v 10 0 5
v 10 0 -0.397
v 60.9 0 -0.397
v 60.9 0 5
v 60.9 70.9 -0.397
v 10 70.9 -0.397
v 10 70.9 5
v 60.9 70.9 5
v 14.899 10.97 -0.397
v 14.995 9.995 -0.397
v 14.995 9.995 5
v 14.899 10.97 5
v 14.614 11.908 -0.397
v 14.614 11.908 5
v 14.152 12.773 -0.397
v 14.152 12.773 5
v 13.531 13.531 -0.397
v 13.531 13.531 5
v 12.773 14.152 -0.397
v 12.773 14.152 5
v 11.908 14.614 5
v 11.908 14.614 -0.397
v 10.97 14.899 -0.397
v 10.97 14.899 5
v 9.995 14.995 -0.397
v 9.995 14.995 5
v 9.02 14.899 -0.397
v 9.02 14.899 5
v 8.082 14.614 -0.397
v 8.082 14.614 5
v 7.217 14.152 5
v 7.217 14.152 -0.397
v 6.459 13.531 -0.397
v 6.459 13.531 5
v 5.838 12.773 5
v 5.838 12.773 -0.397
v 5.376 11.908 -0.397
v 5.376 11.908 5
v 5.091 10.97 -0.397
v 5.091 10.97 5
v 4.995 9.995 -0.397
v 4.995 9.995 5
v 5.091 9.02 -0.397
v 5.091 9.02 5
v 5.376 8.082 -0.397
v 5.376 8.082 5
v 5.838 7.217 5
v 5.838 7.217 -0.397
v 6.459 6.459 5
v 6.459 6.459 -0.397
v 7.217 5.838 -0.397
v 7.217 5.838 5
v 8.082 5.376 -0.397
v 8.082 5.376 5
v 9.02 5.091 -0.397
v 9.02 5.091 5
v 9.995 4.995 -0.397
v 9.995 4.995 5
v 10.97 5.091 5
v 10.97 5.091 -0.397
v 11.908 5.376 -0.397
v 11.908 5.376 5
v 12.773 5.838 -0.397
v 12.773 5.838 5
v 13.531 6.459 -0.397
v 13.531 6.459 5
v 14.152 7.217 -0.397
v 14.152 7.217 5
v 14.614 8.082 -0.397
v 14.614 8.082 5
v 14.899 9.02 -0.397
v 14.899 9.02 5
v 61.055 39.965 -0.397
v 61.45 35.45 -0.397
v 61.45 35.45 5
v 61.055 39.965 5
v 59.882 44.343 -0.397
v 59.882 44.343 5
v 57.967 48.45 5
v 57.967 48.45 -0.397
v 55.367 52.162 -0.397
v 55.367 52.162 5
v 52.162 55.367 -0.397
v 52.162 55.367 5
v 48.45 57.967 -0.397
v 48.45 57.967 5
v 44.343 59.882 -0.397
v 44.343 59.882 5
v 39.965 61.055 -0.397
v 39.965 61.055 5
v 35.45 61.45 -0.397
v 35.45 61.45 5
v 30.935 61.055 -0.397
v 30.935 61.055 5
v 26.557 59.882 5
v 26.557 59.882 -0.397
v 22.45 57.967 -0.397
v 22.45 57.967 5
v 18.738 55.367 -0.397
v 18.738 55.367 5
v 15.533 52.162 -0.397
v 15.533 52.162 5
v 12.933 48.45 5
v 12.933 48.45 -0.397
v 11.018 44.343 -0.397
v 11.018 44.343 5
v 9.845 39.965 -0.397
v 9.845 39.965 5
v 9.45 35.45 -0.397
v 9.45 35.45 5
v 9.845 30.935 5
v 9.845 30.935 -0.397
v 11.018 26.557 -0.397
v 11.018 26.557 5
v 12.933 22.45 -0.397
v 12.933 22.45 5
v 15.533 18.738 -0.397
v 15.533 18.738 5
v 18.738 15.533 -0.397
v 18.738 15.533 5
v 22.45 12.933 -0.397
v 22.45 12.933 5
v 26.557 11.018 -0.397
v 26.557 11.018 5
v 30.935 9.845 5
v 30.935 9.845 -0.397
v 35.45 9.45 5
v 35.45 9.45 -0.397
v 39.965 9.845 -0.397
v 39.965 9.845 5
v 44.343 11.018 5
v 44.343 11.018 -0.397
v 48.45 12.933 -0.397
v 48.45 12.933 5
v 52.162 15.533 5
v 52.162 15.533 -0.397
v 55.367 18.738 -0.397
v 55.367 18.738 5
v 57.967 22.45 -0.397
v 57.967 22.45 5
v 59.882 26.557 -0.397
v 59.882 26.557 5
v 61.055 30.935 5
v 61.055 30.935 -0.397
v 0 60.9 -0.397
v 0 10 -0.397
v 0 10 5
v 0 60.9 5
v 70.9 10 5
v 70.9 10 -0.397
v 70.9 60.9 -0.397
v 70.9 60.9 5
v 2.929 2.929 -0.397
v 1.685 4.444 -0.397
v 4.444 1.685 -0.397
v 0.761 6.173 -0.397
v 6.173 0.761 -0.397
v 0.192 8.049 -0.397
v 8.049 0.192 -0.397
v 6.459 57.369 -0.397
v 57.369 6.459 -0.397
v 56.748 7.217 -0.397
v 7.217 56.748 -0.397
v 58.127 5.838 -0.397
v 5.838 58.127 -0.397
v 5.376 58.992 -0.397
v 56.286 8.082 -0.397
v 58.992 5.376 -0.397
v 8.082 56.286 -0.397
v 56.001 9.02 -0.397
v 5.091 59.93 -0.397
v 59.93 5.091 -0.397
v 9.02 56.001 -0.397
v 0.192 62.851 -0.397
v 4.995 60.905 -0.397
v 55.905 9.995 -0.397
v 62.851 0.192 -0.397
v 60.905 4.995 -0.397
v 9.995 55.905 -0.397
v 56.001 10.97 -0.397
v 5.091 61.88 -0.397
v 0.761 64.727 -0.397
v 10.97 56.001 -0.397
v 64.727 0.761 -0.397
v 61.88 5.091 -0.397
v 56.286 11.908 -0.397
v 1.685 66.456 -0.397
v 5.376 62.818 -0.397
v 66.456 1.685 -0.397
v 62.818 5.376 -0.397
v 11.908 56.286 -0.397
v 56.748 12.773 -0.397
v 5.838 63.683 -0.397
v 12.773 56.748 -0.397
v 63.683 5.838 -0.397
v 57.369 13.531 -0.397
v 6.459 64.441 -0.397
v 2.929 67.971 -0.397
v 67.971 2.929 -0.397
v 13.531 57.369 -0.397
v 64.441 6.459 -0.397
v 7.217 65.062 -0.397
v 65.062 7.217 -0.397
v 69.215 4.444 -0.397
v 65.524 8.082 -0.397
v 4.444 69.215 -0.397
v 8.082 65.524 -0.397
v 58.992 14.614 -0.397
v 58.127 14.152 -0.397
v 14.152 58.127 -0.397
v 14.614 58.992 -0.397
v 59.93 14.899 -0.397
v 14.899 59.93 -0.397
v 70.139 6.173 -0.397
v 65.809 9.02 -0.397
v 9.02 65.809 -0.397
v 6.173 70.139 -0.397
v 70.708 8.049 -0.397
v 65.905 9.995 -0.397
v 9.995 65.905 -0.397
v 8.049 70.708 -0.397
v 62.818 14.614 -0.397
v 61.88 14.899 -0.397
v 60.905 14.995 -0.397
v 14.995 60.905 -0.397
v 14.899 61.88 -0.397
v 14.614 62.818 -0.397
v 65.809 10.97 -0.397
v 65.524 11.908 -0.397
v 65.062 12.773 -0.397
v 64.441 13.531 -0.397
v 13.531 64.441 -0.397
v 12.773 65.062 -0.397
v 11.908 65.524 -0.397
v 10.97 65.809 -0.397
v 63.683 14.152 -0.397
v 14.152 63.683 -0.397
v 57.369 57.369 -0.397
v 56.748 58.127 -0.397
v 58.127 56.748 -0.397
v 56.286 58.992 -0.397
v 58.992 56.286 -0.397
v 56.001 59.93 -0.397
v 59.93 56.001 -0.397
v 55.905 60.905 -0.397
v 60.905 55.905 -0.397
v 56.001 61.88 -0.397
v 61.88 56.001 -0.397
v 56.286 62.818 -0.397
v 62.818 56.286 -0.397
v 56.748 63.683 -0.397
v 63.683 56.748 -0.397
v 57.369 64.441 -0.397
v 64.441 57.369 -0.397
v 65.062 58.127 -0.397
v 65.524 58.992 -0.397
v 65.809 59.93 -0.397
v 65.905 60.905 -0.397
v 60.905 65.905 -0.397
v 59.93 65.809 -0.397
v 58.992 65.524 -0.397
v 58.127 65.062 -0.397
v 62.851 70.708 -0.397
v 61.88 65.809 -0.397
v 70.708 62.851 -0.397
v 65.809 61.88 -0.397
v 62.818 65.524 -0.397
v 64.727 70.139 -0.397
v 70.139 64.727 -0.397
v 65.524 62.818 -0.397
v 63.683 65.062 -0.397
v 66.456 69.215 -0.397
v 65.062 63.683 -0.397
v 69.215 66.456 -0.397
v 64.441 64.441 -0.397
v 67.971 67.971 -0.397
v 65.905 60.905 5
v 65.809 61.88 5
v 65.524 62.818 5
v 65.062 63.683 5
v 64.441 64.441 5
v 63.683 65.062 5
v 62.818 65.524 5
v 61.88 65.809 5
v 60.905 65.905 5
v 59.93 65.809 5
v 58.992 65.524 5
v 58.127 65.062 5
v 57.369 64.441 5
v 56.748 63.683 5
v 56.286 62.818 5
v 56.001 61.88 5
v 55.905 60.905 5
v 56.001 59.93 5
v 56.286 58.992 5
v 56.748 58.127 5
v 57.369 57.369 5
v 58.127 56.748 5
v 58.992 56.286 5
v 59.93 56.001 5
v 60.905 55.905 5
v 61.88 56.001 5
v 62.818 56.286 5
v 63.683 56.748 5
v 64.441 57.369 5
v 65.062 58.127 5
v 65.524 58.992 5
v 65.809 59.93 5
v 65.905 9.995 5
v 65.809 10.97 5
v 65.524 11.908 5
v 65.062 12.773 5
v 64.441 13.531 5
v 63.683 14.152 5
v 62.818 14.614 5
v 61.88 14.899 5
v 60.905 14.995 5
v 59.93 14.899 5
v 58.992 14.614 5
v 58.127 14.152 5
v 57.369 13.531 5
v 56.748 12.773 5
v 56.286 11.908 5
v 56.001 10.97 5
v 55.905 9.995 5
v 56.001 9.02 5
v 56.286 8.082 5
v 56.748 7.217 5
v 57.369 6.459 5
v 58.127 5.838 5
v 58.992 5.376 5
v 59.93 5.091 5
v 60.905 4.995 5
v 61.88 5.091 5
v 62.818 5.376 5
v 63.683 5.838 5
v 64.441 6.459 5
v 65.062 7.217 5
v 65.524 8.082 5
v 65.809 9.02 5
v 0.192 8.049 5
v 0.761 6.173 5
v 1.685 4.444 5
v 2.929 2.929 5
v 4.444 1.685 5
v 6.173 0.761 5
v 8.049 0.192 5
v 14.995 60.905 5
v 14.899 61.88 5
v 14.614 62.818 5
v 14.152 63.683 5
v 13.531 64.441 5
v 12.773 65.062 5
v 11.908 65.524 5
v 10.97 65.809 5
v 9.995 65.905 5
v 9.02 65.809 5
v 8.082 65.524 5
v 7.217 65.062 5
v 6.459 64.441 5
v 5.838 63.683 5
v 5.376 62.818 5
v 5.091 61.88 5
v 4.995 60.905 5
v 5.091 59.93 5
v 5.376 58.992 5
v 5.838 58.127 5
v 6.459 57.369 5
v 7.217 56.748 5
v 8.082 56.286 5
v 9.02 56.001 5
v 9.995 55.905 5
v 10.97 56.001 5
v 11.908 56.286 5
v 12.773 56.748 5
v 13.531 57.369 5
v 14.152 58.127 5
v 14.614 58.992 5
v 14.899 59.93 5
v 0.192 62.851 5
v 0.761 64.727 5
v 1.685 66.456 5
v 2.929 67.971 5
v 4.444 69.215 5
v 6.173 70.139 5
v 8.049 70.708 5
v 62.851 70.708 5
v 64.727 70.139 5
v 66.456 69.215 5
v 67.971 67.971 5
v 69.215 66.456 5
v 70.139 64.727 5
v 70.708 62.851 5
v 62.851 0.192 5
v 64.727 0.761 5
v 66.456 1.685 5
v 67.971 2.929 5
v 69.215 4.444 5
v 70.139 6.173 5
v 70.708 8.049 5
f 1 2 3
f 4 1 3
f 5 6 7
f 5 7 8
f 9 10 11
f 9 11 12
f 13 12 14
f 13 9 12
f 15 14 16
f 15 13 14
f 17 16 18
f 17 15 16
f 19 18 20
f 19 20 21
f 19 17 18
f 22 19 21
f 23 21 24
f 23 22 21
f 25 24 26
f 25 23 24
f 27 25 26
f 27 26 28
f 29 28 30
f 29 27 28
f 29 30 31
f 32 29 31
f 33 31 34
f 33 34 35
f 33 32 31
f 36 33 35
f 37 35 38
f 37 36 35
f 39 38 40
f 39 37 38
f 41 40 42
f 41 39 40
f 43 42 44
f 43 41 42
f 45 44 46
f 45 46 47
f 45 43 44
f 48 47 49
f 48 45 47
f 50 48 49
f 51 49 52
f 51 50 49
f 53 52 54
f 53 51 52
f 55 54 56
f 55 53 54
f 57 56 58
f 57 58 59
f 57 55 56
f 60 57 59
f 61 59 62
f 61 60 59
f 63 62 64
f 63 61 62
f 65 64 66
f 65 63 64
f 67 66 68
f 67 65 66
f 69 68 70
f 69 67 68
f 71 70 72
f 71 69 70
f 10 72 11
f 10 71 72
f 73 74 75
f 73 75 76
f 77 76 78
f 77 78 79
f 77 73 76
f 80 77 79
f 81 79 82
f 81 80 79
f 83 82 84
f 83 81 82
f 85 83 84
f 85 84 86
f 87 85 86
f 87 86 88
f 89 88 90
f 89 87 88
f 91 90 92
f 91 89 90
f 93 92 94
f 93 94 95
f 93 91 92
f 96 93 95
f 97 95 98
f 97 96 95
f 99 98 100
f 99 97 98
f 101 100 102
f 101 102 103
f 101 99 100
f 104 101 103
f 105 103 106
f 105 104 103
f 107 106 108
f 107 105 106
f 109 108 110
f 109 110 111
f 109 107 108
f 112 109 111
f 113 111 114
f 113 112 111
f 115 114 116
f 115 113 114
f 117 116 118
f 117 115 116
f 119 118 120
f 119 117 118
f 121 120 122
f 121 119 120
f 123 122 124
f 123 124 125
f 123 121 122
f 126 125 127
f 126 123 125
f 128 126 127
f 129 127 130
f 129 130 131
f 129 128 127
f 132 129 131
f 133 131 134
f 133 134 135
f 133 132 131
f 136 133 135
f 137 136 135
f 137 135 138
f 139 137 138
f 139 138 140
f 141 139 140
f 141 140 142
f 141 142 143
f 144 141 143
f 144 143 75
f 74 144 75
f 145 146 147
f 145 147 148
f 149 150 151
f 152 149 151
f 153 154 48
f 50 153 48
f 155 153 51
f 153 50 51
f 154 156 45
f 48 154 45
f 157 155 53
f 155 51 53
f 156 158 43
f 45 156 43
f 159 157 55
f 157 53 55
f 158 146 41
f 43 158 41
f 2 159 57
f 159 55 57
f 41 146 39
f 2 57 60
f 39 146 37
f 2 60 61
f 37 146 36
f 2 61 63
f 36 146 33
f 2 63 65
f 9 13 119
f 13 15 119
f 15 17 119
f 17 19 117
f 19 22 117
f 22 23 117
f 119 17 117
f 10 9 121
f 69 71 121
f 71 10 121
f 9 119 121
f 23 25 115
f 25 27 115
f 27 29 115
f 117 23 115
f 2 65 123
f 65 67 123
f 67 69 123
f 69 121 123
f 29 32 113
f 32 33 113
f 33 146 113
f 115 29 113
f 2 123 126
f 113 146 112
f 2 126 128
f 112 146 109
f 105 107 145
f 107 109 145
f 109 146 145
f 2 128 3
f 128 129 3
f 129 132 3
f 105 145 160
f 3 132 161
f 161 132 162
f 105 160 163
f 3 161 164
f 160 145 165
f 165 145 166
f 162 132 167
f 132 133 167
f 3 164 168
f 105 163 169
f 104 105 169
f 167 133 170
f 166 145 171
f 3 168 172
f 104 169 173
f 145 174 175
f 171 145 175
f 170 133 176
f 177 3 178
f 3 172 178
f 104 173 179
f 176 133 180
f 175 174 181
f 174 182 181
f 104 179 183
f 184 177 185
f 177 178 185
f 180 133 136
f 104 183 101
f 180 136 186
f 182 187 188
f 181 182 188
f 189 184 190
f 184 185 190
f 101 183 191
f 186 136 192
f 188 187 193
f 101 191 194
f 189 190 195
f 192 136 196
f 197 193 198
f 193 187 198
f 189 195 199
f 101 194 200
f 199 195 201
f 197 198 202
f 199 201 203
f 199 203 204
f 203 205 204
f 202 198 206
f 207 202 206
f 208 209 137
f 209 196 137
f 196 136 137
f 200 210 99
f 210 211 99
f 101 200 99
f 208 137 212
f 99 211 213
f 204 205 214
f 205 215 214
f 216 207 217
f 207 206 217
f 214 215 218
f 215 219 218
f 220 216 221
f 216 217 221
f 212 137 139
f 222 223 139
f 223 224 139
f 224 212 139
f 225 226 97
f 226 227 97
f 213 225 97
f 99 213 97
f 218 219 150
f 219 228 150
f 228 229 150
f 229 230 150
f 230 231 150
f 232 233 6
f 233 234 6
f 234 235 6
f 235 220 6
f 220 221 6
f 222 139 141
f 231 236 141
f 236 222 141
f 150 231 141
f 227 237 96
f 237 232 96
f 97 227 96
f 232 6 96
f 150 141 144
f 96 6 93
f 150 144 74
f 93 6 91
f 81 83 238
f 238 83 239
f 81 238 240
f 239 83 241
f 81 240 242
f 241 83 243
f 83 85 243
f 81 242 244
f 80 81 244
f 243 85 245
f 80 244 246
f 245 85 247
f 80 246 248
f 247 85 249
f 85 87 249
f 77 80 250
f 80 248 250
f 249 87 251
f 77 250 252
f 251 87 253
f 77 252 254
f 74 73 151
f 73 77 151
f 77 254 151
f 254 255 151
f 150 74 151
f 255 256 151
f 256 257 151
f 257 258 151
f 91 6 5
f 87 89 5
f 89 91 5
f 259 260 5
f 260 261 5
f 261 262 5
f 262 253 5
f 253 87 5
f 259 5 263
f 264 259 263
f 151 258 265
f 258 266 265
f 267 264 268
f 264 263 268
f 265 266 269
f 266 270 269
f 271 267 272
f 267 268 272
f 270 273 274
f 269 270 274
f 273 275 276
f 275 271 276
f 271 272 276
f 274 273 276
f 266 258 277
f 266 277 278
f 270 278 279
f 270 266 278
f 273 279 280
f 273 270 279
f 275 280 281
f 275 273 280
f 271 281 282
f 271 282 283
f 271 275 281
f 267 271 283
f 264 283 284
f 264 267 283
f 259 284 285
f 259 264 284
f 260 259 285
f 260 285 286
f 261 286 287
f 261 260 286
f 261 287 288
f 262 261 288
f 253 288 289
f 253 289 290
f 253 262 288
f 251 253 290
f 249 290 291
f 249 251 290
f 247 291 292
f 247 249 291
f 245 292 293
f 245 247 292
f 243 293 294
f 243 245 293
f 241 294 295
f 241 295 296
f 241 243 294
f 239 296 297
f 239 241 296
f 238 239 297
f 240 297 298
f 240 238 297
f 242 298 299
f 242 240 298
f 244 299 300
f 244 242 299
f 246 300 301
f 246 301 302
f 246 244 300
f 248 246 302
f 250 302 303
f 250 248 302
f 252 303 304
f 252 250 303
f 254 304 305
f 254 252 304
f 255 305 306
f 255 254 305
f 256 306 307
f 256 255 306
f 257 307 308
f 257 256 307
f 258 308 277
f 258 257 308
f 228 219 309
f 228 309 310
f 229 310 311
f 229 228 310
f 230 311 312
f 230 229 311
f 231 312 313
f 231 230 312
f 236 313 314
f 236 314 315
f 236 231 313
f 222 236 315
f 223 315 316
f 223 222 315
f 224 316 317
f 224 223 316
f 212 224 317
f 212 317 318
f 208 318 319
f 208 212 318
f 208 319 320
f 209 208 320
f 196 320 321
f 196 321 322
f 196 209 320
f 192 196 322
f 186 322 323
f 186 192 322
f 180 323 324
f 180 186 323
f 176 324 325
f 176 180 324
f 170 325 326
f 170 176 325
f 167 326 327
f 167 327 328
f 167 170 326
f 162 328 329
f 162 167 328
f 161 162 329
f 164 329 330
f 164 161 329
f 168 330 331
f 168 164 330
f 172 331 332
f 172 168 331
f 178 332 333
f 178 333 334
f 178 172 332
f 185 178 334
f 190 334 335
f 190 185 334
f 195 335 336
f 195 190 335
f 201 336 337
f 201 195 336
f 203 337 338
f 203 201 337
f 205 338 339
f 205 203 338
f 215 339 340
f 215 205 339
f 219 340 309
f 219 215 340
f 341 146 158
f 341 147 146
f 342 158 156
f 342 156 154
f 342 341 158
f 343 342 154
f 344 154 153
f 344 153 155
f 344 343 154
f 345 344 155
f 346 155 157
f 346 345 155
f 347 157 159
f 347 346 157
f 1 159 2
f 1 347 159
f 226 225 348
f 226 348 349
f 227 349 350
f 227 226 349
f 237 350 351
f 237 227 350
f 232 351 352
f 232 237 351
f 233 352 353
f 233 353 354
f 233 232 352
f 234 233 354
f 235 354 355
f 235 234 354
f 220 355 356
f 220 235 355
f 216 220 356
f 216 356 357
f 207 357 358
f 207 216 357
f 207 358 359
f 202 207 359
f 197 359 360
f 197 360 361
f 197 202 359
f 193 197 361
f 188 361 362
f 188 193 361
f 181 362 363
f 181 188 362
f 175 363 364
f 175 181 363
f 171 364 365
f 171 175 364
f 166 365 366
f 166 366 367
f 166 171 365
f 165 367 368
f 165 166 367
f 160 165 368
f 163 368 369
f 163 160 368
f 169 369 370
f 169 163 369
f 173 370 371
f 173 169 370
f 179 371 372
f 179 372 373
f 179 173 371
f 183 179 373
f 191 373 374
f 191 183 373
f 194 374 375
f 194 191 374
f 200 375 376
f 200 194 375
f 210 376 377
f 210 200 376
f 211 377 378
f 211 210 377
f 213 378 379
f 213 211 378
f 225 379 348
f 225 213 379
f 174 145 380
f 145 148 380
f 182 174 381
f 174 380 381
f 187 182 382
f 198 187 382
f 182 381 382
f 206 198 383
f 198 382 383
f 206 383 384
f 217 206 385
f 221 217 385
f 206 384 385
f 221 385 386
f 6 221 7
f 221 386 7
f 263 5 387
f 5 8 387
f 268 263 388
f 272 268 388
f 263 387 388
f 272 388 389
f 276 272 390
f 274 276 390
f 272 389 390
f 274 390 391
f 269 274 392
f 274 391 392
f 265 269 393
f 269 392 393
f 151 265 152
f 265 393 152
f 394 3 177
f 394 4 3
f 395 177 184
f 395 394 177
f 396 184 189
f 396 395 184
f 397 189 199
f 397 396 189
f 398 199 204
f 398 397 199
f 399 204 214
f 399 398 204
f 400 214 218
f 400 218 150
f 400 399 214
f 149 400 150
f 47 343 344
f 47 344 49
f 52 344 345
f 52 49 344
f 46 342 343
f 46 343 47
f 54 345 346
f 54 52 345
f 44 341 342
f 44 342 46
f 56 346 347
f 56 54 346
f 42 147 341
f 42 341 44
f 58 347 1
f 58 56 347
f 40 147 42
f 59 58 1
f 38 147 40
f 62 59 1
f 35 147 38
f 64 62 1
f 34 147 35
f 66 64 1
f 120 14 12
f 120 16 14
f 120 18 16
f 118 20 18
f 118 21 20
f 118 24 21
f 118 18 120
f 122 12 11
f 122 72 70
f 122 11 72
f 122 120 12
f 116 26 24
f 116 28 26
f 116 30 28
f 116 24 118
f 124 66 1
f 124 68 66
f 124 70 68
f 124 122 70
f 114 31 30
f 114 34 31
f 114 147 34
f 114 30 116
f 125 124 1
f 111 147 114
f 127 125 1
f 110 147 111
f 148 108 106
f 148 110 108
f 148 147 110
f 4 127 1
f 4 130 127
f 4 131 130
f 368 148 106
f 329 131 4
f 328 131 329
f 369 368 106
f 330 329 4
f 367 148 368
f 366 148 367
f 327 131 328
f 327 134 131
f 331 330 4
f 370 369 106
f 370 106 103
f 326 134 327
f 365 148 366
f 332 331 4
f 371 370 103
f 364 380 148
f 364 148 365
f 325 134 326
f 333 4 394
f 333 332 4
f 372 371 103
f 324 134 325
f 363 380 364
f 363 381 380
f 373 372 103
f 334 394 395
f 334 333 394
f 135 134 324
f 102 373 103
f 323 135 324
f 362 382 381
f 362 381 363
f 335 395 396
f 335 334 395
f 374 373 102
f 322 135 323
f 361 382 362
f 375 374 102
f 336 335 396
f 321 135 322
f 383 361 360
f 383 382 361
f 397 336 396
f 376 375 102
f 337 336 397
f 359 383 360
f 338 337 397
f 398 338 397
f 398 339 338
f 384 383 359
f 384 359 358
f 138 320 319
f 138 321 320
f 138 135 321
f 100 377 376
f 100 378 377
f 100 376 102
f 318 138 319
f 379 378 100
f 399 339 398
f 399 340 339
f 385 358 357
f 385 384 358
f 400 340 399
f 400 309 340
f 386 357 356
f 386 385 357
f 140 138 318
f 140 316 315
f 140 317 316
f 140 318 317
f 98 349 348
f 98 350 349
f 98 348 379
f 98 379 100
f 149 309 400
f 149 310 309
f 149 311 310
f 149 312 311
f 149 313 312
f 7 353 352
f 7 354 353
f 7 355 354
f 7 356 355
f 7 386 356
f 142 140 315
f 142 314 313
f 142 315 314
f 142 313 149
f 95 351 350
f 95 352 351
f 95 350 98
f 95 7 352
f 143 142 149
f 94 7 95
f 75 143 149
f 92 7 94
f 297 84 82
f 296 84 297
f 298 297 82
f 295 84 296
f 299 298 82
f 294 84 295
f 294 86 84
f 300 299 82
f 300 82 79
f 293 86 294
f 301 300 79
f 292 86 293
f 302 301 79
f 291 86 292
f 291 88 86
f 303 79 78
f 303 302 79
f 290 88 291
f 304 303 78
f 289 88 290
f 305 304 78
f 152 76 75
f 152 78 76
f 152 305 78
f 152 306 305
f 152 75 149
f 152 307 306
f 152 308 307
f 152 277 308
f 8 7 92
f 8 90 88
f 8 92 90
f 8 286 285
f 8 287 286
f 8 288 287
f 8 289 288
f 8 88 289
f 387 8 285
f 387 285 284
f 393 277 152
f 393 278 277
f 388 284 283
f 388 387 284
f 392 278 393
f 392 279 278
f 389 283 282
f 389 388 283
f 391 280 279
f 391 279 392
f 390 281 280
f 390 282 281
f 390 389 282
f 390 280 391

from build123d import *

# Parameters (mm, degrees)
BOSS_EXTRUDE1_DEPTH      = 5
BOSS_EXTRUDE1_DEPTH_BACK = 0.397201273
SKETCH1_W                = 70.9
SKETCH1_H                = 70.9
SKETCH1_R                = 5
SKETCH1_R_2              = 26
FILLET1_R                = 10


with BuildPart() as part:
    # Sketch1 → Boss-Extrude1 (new, two sides: drawn at the far end of the back side and taken through both)
    with BuildSketch(Plane.XY.offset(-BOSS_EXTRUDE1_DEPTH_BACK)):
        with Locations((35.45, 35.45)):
            Rectangle(SKETCH1_W, SKETCH1_H)
        with Locations((9.995, 60.905)):
            Circle(SKETCH1_R, mode=Mode.SUBTRACT)
        with Locations((60.905, 60.905)):
            Circle(SKETCH1_R, mode=Mode.SUBTRACT)
        with Locations((60.905, 9.995)):
            Circle(SKETCH1_R, mode=Mode.SUBTRACT)
        with Locations((9.995, 9.995)):
            Circle(SKETCH1_R, mode=Mode.SUBTRACT)
        with Locations((35.45, 35.45)):
            Circle(SKETCH1_R_2, mode=Mode.SUBTRACT)
    extrude(amount=BOSS_EXTRUDE1_DEPTH + BOSS_EXTRUDE1_DEPTH_BACK)

    # Fillet1
    fillet1_edges = [part.edges().sort_by_distance(p)[0] for p in [
        (0, 70.9, 2.301399364),
        (70.9, 70.9, 2.301399364),
        (70.9, 0, 2.301399364),
        (0, 0, 2.301399364),
    ]]
    fillet(fillet1_edges, radius=FILLET1_R)


solid = part.part
